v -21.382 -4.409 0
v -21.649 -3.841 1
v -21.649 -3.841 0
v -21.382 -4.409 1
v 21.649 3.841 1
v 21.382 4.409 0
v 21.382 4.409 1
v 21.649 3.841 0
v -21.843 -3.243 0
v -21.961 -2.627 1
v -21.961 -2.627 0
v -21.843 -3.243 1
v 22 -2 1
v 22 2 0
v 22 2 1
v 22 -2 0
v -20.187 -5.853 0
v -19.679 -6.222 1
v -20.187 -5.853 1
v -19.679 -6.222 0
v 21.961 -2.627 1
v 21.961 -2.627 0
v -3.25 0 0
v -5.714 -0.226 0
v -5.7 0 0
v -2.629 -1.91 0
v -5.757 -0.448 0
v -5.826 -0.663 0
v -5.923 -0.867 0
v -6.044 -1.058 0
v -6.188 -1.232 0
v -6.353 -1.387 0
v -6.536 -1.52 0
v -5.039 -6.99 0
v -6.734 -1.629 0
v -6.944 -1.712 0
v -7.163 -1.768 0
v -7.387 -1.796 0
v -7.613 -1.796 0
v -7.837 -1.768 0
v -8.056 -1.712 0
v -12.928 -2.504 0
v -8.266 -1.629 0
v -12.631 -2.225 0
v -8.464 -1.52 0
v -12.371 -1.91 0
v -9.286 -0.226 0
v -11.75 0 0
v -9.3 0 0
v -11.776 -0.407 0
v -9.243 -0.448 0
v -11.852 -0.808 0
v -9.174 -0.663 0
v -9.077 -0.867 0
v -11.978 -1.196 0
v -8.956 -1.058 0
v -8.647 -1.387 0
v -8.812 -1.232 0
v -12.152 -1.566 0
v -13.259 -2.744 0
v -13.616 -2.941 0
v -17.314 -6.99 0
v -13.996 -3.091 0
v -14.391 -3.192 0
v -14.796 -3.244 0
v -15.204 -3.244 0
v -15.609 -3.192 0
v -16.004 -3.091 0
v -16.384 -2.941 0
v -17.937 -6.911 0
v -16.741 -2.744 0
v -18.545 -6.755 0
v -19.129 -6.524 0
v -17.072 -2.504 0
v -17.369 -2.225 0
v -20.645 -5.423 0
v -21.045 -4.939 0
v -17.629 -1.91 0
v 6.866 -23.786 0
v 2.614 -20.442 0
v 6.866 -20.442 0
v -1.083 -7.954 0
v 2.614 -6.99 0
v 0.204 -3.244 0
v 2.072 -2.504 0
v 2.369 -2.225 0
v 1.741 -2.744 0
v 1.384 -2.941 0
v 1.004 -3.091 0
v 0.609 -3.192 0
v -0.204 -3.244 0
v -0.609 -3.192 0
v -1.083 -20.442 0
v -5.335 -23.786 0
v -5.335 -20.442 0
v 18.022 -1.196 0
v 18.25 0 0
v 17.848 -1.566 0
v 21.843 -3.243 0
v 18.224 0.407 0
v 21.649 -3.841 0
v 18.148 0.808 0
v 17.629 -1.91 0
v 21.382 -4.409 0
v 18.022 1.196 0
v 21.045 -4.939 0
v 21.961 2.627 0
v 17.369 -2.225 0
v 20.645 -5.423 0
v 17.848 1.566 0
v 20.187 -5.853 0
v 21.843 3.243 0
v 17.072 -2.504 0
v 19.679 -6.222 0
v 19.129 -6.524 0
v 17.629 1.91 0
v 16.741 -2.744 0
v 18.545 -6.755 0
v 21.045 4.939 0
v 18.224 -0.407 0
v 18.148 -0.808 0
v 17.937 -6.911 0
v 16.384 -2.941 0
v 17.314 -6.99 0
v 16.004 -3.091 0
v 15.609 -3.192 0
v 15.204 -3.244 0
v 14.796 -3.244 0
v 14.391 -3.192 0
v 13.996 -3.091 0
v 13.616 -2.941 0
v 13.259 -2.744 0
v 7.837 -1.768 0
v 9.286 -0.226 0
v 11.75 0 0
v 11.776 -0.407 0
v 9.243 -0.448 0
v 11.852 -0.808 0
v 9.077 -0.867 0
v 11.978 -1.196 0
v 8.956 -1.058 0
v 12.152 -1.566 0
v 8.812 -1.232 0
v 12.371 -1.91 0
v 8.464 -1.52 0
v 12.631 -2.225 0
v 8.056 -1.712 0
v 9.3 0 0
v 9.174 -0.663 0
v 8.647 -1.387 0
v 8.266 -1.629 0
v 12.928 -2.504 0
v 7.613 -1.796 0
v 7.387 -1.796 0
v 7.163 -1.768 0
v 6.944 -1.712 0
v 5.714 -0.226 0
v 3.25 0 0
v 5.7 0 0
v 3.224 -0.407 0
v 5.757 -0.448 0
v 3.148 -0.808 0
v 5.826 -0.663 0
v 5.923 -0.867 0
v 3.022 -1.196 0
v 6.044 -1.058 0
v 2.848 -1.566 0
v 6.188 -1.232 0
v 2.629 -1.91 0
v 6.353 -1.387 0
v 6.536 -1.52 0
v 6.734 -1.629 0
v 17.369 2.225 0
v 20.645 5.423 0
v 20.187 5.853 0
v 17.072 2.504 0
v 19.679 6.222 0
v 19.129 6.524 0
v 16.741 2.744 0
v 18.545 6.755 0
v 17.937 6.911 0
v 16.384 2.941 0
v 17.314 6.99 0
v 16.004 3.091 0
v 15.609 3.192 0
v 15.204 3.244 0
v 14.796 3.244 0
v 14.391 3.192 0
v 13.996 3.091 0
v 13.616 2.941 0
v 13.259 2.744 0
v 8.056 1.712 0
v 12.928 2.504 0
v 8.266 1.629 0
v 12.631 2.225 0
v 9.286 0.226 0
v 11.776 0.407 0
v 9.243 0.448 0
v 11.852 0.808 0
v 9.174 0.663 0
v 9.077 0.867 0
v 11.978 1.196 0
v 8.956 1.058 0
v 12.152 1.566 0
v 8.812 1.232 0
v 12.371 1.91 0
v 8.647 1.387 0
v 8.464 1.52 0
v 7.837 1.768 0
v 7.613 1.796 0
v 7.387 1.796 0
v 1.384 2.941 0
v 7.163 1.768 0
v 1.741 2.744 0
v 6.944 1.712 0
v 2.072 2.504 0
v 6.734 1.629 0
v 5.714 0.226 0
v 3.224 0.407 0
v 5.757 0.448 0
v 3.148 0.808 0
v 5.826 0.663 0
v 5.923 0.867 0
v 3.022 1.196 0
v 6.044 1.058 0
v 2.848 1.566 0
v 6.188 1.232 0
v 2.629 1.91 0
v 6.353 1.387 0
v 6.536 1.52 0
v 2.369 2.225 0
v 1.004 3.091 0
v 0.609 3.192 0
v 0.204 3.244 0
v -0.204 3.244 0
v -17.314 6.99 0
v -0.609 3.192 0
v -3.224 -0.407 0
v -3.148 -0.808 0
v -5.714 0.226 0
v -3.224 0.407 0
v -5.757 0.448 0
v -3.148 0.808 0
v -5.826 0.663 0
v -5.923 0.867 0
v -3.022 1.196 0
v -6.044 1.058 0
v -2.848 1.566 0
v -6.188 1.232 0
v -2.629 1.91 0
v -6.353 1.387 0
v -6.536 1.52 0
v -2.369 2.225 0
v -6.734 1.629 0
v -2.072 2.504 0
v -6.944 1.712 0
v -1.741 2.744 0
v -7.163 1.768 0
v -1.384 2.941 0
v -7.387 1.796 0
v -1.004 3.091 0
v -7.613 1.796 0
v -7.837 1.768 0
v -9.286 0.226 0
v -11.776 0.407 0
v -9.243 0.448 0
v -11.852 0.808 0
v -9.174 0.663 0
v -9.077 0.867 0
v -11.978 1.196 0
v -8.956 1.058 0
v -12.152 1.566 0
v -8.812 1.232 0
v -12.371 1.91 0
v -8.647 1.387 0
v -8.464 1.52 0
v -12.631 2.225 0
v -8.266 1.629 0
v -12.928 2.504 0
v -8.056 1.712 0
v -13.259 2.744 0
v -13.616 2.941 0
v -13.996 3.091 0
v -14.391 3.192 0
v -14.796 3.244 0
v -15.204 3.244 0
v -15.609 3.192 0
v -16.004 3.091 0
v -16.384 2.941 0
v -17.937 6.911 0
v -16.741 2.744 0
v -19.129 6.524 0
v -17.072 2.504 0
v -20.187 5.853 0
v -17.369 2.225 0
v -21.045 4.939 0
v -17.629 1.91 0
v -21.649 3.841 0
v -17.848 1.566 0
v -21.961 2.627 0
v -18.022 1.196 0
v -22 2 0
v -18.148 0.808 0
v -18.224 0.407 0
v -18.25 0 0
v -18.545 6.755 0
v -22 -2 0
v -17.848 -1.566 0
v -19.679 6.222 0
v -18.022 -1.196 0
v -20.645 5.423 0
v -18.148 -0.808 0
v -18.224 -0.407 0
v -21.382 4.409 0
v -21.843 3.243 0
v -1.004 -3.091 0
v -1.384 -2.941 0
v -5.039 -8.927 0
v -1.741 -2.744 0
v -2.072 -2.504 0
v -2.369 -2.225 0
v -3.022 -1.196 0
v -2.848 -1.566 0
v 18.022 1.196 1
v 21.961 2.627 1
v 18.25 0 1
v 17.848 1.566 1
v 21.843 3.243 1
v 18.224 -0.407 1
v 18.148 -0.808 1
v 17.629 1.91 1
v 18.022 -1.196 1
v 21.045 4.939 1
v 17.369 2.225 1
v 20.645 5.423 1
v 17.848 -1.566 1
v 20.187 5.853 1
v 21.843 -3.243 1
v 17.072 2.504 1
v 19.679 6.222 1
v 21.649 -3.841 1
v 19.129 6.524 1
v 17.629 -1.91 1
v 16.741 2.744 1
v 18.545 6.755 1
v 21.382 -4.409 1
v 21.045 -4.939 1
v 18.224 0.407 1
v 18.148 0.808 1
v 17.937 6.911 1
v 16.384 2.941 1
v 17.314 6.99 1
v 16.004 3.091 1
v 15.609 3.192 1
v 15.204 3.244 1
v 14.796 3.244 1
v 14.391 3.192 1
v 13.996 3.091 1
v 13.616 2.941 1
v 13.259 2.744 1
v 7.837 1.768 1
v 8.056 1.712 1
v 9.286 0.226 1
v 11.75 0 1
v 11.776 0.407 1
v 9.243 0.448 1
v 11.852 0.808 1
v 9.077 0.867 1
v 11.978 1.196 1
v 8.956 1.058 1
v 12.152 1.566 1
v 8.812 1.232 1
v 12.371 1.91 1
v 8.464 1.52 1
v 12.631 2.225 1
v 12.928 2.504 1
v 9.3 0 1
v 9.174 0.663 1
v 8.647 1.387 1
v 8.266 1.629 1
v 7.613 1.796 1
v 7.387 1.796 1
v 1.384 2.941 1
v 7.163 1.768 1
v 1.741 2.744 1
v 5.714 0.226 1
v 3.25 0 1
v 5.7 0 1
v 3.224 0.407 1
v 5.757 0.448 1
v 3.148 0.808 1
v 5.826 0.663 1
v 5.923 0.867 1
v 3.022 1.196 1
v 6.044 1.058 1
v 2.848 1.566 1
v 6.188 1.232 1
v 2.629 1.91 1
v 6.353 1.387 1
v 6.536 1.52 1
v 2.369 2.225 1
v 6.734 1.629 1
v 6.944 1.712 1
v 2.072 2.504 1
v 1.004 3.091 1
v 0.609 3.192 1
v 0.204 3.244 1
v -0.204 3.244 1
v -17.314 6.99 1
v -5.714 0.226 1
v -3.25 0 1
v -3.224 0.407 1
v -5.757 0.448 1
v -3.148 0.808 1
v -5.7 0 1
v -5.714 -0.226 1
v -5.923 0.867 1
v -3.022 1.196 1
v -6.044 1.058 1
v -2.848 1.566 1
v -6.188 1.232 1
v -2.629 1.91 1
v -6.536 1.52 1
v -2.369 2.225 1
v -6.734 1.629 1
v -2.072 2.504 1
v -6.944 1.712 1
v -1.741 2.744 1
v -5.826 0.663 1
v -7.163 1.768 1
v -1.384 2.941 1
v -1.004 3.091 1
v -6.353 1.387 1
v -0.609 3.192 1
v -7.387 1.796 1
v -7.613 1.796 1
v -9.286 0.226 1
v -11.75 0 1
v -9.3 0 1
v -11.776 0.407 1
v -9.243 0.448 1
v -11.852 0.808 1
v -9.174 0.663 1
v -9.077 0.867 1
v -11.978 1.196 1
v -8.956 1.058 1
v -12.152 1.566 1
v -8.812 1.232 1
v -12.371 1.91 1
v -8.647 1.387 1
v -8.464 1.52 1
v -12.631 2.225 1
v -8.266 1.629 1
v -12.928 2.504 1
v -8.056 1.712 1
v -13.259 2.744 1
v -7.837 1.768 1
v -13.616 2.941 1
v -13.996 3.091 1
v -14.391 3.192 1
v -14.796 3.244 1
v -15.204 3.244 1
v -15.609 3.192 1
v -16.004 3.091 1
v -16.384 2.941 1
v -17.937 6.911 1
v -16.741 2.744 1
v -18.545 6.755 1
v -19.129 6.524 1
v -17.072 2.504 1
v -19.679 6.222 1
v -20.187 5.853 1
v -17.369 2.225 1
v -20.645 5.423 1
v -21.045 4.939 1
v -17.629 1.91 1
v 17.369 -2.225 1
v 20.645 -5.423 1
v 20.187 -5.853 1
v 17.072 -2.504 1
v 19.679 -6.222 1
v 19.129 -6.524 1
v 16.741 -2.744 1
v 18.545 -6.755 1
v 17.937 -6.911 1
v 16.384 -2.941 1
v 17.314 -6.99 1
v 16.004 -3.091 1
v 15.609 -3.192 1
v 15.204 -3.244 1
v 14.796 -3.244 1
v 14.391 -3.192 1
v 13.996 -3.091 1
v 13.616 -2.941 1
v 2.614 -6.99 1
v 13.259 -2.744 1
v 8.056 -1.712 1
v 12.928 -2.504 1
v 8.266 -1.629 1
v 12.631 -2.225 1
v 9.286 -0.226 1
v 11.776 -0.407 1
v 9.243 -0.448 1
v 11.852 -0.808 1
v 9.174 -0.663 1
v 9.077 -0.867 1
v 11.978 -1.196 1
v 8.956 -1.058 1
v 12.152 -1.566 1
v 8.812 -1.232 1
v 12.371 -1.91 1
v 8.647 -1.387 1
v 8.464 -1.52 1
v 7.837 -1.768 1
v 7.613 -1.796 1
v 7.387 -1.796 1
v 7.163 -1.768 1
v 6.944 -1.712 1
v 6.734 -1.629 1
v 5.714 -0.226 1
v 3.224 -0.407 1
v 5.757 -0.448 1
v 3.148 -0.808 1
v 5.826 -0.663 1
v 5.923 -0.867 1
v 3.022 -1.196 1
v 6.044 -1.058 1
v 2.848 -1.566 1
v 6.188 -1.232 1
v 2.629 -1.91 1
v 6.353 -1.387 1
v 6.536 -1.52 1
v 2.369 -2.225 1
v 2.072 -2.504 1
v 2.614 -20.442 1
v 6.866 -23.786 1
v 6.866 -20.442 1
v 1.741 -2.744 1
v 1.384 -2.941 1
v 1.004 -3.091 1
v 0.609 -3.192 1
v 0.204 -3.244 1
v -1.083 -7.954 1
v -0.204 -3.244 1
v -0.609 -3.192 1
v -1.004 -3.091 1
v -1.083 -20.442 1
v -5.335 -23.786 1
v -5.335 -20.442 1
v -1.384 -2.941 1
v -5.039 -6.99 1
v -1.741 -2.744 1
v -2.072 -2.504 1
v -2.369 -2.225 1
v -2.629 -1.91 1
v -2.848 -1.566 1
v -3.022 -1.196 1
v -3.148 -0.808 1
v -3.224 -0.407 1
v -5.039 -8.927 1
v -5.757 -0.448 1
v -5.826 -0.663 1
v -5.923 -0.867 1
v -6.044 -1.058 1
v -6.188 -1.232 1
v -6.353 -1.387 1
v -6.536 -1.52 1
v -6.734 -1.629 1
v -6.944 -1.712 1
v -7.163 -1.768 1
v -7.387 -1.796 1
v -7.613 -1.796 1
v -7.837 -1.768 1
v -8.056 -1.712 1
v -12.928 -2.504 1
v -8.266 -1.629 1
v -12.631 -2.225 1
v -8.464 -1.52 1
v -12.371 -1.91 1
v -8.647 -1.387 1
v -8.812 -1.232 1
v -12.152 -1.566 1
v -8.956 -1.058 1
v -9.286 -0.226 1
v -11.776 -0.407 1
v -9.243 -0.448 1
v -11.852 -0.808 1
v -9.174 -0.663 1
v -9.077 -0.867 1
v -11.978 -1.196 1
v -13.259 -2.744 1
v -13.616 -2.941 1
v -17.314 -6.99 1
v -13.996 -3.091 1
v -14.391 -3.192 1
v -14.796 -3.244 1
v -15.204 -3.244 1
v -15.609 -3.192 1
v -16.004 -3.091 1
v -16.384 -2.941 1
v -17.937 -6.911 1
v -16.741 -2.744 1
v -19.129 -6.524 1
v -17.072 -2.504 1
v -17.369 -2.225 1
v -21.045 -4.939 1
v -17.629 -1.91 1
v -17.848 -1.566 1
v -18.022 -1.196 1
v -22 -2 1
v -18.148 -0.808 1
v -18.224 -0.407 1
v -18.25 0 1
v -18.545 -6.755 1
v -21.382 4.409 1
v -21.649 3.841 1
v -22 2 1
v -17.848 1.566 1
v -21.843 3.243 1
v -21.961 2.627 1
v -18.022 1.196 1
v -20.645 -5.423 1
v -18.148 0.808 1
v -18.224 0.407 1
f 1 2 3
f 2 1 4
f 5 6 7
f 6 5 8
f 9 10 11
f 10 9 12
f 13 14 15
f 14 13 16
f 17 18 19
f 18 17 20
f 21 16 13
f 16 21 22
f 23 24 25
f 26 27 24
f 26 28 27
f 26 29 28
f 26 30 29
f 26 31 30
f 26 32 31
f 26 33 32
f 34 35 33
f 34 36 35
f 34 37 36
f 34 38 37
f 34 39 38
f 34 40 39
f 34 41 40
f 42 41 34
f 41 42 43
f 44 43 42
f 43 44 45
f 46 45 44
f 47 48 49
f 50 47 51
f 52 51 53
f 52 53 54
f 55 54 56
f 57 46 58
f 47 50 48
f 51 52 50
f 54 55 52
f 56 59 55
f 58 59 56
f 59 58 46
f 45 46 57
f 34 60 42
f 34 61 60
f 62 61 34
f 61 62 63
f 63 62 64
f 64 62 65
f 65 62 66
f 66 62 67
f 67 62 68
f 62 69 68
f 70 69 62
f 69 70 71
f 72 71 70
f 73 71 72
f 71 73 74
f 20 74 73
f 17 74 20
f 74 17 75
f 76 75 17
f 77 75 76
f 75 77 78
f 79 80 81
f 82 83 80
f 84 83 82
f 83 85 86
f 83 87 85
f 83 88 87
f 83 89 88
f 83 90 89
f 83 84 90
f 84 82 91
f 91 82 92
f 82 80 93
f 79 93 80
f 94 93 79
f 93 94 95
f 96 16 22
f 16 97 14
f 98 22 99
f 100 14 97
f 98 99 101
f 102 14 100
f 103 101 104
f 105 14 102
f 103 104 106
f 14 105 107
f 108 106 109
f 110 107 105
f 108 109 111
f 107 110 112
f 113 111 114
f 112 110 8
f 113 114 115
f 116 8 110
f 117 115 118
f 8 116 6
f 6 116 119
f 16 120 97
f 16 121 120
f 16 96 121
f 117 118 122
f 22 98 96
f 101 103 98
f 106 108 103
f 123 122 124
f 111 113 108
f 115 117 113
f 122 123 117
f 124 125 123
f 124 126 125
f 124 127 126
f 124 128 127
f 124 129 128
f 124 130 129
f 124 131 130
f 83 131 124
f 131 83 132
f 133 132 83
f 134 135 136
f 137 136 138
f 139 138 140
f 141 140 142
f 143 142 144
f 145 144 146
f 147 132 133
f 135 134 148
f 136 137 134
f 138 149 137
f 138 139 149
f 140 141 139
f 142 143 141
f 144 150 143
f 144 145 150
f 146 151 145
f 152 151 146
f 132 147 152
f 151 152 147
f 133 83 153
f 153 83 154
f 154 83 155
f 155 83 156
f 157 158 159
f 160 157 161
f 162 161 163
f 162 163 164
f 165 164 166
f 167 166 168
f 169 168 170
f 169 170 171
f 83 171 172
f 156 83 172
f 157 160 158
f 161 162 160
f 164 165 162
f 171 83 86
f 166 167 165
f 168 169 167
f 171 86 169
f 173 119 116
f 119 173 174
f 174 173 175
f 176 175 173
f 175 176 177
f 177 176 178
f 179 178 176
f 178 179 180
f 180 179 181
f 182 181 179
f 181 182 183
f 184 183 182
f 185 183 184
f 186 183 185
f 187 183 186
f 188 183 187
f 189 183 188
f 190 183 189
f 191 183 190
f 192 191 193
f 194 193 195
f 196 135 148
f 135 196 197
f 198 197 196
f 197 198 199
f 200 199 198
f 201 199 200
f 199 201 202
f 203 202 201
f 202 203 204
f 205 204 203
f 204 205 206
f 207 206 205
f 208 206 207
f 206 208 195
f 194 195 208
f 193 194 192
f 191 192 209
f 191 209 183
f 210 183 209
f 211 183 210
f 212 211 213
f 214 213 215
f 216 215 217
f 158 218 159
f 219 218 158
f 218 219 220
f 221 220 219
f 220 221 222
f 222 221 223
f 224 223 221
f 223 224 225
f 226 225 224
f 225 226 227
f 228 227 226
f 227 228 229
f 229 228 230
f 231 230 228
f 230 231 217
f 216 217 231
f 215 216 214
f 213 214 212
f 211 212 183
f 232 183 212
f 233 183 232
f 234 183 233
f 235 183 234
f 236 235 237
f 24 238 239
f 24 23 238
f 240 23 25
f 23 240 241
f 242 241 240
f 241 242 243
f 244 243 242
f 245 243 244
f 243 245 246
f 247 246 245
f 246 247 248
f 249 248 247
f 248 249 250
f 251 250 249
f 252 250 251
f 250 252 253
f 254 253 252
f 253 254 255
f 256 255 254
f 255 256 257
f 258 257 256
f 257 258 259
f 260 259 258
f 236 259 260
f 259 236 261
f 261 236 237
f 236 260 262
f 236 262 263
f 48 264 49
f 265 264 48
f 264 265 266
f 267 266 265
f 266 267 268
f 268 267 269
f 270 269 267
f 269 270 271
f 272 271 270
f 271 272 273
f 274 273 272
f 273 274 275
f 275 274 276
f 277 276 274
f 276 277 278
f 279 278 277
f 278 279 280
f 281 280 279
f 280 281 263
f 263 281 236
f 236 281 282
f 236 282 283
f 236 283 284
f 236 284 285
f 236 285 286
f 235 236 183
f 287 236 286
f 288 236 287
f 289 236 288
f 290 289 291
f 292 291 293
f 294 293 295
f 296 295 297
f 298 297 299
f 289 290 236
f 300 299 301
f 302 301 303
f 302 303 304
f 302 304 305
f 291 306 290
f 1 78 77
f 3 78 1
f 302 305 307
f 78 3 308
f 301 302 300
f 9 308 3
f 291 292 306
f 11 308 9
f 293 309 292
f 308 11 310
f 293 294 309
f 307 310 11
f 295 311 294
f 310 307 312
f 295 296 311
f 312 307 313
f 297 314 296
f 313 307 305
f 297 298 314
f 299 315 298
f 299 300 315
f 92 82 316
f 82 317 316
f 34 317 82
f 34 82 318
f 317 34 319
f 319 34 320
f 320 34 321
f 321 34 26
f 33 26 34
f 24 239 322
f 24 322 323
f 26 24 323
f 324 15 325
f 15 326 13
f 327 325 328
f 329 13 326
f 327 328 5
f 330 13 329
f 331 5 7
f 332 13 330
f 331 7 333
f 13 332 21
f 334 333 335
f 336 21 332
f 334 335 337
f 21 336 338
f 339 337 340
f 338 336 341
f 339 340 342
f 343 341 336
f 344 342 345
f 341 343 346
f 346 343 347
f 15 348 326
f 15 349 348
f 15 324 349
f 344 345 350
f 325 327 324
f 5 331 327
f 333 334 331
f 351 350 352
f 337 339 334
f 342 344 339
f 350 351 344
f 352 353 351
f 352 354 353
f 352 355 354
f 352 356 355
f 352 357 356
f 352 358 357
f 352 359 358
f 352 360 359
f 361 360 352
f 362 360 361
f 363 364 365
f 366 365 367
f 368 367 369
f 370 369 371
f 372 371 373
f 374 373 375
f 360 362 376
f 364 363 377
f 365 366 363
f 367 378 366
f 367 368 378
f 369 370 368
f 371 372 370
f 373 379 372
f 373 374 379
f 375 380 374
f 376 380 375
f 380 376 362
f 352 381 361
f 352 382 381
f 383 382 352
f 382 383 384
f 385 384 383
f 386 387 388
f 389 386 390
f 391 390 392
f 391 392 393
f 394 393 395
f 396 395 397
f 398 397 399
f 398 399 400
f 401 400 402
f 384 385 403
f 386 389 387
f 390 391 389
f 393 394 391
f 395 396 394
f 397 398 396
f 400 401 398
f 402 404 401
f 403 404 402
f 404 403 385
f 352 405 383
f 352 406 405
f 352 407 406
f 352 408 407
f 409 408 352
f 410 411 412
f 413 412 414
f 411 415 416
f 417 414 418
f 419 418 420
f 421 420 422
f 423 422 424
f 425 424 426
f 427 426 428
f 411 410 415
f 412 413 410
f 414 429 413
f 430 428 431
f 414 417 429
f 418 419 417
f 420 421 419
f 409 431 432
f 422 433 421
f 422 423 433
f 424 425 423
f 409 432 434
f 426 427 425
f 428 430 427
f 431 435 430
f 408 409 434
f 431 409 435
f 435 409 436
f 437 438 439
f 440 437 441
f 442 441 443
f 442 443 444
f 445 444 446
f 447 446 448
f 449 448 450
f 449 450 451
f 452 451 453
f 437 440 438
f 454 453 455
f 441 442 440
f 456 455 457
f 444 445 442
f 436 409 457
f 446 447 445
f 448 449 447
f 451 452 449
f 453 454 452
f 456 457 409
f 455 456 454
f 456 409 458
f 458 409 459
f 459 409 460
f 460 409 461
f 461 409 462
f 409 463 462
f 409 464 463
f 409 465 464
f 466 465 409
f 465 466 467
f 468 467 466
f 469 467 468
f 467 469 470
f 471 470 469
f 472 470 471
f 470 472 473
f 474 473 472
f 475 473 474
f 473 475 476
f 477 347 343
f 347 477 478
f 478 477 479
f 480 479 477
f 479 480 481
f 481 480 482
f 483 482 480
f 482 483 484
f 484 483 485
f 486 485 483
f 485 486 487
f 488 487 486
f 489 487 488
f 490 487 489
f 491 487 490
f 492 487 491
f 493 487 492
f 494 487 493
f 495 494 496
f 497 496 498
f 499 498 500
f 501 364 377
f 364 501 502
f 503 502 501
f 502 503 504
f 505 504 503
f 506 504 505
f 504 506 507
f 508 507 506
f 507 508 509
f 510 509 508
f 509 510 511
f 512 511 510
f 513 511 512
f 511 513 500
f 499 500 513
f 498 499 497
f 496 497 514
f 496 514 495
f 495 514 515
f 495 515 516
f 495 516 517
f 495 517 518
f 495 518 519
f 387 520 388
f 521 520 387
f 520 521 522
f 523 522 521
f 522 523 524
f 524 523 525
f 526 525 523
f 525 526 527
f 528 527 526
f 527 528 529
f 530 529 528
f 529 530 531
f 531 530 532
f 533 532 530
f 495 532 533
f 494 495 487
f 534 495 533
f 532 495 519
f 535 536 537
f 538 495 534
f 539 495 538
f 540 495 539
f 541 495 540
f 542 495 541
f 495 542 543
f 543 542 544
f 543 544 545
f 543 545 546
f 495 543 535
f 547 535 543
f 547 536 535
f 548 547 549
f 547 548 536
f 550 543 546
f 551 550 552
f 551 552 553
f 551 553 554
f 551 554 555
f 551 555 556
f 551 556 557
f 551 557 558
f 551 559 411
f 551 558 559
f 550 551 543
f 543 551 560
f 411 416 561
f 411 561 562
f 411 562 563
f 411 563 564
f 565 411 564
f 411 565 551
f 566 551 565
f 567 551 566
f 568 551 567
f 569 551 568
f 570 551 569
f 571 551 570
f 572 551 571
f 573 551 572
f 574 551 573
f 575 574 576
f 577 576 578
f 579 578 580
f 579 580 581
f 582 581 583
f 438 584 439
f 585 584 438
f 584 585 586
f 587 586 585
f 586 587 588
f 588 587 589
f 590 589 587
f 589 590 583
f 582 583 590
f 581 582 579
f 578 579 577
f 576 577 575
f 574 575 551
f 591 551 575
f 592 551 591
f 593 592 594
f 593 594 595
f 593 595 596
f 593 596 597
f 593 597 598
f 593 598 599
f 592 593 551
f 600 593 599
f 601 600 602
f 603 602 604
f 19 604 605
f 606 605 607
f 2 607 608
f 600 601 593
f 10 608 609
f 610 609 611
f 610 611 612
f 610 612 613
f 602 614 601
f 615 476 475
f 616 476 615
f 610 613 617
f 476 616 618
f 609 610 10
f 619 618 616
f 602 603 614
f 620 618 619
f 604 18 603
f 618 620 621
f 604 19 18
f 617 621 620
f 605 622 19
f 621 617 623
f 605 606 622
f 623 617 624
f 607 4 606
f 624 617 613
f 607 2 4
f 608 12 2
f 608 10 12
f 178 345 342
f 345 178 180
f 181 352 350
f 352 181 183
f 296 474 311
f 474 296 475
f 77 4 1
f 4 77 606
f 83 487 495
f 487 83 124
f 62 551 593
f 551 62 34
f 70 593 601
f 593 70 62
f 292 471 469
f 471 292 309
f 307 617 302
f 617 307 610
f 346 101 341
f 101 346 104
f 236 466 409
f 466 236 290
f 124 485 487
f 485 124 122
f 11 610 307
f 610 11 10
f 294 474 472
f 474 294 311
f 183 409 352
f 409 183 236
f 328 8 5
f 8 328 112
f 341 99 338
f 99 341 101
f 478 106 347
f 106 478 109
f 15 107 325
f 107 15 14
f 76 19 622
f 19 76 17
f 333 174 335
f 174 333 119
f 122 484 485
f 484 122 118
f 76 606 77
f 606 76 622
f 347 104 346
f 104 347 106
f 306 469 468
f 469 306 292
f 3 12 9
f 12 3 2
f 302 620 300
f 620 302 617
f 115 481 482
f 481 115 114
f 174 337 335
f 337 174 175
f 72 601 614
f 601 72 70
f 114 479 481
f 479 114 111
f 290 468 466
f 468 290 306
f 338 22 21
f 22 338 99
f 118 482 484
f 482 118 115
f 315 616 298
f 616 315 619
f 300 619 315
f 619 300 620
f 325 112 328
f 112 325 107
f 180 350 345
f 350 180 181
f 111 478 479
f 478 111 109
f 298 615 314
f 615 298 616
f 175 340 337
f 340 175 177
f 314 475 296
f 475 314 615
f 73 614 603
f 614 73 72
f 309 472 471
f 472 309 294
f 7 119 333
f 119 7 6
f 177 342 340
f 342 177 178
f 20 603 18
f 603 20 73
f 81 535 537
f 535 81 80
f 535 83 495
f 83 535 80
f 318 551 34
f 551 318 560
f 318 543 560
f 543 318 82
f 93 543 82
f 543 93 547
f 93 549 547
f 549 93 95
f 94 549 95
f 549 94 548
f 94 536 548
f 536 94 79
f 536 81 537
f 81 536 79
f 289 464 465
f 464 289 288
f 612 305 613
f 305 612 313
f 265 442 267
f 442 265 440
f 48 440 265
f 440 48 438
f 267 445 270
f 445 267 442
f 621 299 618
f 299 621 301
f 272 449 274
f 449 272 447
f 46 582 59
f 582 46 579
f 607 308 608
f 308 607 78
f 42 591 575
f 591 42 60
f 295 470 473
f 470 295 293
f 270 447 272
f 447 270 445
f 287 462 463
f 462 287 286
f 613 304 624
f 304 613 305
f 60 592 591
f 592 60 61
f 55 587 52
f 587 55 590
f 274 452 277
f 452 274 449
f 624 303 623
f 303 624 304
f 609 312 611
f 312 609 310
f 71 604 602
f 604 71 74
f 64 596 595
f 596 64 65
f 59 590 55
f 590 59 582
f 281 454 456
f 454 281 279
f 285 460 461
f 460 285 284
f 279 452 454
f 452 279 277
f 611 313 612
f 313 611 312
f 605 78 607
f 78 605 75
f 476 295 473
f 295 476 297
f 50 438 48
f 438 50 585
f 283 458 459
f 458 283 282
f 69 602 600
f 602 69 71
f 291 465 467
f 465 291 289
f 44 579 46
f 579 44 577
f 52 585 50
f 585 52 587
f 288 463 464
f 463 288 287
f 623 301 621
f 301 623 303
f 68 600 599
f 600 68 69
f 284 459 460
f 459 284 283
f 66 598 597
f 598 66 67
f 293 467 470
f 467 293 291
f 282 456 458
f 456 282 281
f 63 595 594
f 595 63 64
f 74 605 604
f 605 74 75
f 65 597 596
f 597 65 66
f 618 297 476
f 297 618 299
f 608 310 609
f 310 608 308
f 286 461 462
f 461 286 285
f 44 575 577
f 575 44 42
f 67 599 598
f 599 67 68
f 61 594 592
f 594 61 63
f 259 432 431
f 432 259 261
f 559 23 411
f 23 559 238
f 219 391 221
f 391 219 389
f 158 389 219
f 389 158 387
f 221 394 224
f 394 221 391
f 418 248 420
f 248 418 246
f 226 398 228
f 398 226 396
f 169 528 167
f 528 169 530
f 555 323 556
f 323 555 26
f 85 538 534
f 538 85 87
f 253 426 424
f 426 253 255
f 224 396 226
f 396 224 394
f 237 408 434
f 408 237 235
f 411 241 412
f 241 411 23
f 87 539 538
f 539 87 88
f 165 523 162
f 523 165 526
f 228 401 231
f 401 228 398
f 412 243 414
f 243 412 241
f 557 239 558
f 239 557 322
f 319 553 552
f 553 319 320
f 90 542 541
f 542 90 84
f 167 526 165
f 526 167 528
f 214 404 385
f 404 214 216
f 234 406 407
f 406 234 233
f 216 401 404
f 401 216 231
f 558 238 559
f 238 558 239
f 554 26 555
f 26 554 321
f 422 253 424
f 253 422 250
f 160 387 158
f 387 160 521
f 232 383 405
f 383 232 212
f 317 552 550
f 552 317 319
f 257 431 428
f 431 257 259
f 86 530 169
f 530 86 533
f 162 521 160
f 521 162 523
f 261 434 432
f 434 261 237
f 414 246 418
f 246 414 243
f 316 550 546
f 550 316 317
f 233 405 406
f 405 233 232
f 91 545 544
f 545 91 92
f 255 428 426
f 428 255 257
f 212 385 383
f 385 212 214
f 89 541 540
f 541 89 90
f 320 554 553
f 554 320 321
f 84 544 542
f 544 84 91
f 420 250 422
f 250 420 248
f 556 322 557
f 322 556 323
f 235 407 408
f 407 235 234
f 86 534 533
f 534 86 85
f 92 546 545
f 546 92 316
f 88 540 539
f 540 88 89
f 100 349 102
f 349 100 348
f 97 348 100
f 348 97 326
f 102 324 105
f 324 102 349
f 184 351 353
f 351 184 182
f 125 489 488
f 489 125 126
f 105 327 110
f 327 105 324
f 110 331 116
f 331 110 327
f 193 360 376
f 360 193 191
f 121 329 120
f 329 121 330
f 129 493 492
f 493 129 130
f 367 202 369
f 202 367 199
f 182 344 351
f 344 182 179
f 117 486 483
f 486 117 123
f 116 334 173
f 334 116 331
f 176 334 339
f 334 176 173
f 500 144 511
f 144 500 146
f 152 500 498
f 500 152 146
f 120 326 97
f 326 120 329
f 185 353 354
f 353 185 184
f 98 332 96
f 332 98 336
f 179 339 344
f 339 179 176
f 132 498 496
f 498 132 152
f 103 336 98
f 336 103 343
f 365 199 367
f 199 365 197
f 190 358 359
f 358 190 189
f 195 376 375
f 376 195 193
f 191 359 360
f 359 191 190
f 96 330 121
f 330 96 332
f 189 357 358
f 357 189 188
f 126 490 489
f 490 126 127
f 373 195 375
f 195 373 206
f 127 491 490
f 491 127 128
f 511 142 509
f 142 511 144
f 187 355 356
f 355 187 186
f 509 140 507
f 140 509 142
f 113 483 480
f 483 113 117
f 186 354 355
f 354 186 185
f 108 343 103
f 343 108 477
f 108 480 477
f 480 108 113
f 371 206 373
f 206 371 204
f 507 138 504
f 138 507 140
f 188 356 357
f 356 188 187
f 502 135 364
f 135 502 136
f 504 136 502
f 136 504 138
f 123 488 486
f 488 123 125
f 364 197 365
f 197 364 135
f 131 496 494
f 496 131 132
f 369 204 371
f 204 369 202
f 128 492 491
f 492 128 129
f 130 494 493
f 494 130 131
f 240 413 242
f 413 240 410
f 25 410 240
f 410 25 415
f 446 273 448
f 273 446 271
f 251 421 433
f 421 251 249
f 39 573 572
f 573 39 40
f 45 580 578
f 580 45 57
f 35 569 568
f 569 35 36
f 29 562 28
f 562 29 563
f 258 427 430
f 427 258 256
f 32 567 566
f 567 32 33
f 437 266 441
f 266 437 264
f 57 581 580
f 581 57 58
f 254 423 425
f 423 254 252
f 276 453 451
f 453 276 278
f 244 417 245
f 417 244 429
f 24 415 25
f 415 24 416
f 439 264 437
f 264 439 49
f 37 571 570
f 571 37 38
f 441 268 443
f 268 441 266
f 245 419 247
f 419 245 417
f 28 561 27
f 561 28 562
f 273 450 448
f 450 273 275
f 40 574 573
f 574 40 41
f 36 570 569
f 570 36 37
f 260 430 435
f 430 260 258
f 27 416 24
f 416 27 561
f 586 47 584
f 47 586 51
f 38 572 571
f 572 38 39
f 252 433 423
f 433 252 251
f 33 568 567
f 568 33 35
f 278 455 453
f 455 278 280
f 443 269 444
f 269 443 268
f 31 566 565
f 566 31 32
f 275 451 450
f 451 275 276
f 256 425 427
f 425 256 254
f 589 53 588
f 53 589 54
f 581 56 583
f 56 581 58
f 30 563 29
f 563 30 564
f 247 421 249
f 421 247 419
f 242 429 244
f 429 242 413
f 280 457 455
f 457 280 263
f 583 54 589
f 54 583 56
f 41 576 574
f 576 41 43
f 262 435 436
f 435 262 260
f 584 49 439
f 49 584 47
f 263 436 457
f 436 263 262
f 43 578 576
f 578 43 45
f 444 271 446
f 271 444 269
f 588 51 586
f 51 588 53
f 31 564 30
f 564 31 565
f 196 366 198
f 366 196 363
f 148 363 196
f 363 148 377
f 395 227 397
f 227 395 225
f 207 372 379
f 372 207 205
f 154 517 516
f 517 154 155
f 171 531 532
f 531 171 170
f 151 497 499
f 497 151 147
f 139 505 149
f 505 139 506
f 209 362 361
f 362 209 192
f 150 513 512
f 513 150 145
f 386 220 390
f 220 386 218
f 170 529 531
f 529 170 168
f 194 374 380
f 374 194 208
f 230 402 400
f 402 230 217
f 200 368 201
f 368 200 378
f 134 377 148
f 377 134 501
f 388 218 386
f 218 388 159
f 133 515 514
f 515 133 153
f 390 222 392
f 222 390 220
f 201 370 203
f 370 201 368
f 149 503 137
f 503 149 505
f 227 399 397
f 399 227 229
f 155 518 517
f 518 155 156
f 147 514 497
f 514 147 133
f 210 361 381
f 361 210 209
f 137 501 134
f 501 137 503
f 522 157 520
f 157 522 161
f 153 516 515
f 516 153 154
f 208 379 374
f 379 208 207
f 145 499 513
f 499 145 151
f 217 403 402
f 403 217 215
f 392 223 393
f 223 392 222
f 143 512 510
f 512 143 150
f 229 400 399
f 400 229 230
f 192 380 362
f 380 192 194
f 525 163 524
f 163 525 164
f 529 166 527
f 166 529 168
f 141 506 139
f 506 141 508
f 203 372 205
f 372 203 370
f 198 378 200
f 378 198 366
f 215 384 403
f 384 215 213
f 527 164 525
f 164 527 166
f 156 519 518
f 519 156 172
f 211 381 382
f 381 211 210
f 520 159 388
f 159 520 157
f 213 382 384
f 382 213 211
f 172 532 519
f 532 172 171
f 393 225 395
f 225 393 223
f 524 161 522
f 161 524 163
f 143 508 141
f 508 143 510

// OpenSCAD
$fn = 50;


difference() {
	union() {
		*color(alpha = 1.0000000000, c = "gray") {
			translate(v = [0, 14, 0]) {
				linear_extrude(height = 1) {
					text(font = "Arial:style=Bold", halign = "center", size = 4.5000000000, text = "COMMENT description oobb_plate_shape_p_type_1_depth_3_width_1_thickness_1_extra_oobb_size", valign = "center");
				}
			}
		}
		hull() {
			translate(v = [-17.0000000000, 2.0000000000, 0]) {
				cylinder(h = 1, r = 5);
			}
			translate(v = [17.0000000000, 2.0000000000, 0]) {
				cylinder(h = 1, r = 5);
			}
			translate(v = [-17.0000000000, -2.0000000000, 0]) {
				cylinder(h = 1, r = 5);
			}
			translate(v = [17.0000000000, -2.0000000000, 0]) {
				cylinder(h = 1, r = 5);
			}
		}
		translate(v = [0, -5, 0]) {
			linear_extrude(height = 1) {
				text(font = "DejaVu Sans Mono:style=Bold", halign = "center", size = 19.0000000000, text = "1", valign = "top");
			}
		}
	}
	union() {
		*color(alpha = 1.0000000000, c = "gray") {
			translate(v = [0, 14, 0]) {
				linear_extrude(height = 1) {
					text(font = "Arial:style=Bold", halign = "center", size = 4.5000000000, text = "COMMENT description oobb_holes_shape_n_type_3_width_1_thickness_1_extra_oobb_size_1_height_'all'_holes_true_both_holes", valign = "center");
				}
			}
		}
		translate(v = [-15.0000000000, 0.0000000000, 0]) {
			translate(v = [0, 0, -50]) {
				cylinder(h = 100, r = 3.2500000000);
			}
		}
		translate(v = [0, 0, -50]) {
			cylinder(h = 100, r = 3.2500000000);
		}
		translate(v = [15.0000000000, 0.0000000000, 0]) {
			translate(v = [0, 0, -50]) {
				cylinder(h = 100, r = 3.2500000000);
			}
		}
		translate(v = [-15.0000000000, 0.0000000000, 0]) {
			translate(v = [0, 0, -50]) {
				cylinder(h = 100, r = 1.8000000000);
			}
		}
		translate(v = [-7.5000000000, 0.0000000000, 0]) {
			translate(v = [0, 0, -50]) {
				cylinder(h = 100, r = 1.8000000000);
			}
		}
		translate(v = [0, 0, -50]) {
			cylinder(h = 100, r = 1.8000000000);
		}
		translate(v = [7.5000000000, 0.0000000000, 0]) {
			translate(v = [0, 0, -50]) {
				cylinder(h = 100, r = 1.8000000000);
			}
		}
		translate(v = [15.0000000000, 0.0000000000, 0]) {
			translate(v = [0, 0, -50]) {
				cylinder(h = 100, r = 1.8000000000);
			}
		}
	}
}
